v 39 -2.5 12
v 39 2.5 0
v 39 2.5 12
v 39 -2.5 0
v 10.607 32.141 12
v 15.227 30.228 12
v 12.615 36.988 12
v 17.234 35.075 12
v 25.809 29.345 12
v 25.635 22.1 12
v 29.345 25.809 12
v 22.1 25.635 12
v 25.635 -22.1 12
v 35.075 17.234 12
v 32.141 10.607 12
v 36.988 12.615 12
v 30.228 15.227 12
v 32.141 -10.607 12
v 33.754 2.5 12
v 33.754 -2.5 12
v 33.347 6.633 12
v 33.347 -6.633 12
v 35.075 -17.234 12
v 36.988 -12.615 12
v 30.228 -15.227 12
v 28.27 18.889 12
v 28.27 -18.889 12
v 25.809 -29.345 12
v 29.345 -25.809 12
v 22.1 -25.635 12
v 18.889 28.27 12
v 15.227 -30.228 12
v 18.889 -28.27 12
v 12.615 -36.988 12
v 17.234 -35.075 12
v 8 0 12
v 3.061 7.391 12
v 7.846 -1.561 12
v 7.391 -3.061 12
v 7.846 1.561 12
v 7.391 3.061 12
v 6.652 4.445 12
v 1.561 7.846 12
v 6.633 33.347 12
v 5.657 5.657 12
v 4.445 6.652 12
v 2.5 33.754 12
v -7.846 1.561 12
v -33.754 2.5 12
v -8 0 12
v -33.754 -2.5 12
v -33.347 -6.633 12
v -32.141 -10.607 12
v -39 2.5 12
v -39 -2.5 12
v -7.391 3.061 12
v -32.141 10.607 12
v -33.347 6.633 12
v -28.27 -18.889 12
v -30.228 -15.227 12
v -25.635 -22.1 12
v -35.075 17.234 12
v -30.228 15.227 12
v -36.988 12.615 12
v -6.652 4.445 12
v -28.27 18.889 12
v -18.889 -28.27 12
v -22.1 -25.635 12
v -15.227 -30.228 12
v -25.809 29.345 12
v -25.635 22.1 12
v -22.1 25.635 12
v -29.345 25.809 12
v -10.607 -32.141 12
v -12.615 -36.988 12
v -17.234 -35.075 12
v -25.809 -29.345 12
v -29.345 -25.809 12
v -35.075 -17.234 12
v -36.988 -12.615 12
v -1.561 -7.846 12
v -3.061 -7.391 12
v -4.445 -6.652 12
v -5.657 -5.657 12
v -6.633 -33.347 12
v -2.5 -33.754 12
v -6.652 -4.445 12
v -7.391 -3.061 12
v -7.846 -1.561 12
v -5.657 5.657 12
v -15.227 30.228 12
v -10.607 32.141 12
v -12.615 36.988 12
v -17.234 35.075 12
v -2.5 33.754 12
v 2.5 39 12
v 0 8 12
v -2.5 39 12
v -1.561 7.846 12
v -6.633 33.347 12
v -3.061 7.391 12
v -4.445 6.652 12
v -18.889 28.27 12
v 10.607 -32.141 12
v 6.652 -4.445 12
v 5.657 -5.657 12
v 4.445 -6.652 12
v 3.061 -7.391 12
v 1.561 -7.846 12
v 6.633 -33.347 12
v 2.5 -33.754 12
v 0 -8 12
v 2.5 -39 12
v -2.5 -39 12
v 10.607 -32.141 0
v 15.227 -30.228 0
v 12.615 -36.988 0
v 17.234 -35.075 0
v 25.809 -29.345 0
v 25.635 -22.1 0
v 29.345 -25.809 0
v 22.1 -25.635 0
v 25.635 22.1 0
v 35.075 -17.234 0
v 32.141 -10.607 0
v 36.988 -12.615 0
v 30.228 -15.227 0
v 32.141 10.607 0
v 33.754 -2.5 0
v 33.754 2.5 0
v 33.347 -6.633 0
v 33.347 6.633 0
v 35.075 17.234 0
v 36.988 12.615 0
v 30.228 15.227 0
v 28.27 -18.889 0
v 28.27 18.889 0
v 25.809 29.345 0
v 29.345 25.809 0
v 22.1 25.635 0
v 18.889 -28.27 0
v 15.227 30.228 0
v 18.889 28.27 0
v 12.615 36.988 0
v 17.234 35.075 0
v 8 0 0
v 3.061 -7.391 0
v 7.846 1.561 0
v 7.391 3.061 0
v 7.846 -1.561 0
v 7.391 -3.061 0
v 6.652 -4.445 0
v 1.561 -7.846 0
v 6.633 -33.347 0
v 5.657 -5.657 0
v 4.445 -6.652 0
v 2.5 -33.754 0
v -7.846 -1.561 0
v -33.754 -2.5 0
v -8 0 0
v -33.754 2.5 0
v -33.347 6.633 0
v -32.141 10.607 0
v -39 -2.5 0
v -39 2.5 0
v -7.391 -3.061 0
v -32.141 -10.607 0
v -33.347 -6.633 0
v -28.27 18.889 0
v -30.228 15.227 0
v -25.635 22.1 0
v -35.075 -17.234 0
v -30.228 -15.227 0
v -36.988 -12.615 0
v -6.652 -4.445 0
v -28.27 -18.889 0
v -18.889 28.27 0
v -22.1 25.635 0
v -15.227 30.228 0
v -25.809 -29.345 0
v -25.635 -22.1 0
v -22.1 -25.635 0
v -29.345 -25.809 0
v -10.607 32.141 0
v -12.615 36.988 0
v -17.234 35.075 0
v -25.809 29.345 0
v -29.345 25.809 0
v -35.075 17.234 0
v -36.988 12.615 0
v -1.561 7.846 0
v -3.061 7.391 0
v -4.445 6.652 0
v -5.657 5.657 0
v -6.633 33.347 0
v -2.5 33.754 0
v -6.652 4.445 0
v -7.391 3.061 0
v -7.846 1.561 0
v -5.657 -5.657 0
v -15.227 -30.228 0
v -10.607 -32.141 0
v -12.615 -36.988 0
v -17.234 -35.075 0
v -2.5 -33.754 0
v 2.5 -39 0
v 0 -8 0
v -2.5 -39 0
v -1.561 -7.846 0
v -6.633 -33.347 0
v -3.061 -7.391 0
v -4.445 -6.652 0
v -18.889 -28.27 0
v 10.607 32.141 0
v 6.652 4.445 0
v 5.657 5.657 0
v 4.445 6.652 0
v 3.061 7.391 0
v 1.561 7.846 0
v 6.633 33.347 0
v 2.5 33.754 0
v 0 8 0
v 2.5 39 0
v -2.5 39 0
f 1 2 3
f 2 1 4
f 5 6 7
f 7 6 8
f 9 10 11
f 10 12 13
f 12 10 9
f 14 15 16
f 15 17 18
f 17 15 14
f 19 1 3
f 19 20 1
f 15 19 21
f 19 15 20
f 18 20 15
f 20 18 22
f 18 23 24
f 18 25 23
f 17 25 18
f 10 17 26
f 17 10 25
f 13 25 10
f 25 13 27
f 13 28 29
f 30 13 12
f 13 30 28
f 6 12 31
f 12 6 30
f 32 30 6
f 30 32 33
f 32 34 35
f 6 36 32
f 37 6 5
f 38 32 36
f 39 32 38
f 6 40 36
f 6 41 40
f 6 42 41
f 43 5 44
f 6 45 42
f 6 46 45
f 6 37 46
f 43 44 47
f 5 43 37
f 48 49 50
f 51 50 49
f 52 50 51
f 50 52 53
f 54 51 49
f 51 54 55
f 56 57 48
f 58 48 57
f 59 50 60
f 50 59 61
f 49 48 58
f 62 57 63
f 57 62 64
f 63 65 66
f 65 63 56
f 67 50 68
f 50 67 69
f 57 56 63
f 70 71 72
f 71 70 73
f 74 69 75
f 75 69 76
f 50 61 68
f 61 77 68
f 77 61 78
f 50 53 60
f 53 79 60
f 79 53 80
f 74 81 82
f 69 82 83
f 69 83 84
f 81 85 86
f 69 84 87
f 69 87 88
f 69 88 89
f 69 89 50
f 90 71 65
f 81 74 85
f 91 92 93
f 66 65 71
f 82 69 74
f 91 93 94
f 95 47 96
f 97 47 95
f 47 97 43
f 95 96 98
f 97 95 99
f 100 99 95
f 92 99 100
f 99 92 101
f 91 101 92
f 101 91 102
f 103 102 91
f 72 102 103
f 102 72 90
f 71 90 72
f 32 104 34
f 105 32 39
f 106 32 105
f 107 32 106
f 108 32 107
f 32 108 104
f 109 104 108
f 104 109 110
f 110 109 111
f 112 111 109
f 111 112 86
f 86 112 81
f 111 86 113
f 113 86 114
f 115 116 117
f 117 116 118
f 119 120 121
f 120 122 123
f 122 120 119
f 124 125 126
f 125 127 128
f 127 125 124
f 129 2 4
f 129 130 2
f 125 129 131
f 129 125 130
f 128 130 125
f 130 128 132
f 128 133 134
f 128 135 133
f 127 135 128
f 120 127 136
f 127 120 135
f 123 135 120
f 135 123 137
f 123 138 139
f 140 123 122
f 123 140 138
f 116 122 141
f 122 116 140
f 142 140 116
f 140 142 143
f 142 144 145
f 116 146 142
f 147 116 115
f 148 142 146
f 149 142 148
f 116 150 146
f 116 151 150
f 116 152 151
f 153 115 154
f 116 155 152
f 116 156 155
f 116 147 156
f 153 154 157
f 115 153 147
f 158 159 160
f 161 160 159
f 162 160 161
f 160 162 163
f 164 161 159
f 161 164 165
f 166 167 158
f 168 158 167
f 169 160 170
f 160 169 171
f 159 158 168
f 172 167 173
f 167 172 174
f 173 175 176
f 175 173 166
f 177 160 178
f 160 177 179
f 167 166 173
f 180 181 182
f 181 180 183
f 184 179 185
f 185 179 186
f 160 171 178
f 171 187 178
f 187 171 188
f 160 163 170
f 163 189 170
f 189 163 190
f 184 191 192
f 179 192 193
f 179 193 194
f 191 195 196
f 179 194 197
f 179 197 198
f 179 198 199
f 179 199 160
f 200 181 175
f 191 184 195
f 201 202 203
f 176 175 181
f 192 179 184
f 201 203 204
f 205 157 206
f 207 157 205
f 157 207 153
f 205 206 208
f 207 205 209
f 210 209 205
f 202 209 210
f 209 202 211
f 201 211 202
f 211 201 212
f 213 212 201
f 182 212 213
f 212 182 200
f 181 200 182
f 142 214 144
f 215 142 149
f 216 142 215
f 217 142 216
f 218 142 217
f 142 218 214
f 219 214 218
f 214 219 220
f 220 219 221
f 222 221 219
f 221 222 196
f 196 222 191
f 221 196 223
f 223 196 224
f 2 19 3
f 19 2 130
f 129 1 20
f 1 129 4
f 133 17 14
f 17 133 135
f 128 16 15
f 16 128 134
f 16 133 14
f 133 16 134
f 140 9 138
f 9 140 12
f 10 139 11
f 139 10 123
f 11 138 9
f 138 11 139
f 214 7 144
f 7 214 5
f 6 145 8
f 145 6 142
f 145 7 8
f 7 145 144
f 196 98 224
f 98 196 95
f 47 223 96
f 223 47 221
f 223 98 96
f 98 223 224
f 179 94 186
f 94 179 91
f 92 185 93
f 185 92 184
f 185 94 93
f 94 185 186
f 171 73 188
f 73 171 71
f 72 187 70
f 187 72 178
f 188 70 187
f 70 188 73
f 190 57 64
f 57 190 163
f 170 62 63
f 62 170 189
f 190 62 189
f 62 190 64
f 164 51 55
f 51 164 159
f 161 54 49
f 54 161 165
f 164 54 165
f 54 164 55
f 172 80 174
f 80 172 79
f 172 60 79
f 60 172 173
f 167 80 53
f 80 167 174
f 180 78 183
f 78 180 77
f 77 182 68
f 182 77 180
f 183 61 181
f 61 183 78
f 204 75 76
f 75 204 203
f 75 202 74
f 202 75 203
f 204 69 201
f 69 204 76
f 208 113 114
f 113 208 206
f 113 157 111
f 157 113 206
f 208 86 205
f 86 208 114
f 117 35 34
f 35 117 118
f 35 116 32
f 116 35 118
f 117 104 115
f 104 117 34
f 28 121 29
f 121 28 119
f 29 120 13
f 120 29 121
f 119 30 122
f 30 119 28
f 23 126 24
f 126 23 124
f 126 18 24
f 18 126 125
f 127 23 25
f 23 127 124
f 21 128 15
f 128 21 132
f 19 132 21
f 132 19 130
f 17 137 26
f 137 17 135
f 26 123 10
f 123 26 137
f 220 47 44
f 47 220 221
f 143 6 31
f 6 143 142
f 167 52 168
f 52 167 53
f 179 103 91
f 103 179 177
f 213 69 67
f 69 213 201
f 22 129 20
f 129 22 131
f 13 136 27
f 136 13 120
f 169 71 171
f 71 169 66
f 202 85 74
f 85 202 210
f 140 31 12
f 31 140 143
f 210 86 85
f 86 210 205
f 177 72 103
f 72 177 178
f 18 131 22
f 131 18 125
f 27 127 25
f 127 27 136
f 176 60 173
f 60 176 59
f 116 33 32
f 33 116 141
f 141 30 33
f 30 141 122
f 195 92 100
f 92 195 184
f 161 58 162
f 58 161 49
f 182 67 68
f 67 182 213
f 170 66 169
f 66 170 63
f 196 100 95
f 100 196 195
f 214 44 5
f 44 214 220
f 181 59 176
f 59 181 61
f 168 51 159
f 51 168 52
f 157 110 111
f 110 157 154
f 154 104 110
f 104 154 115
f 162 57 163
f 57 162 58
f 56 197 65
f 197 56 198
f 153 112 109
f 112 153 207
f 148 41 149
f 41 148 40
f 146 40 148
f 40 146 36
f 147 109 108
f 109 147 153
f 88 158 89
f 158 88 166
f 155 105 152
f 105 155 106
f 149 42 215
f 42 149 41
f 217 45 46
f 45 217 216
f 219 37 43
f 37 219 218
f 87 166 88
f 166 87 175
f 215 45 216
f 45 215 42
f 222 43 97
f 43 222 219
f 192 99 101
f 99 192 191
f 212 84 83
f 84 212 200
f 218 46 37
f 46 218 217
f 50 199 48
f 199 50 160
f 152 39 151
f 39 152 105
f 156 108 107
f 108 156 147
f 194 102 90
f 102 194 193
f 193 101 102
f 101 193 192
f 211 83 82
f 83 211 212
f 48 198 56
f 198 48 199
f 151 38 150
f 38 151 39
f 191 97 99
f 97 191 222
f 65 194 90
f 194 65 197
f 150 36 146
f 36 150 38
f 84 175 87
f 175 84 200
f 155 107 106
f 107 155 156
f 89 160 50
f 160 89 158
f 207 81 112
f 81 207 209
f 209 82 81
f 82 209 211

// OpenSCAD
$fn = 32;

// ----------------------------------------------------------------------
// Spur blank: bored gear blank
// ----------------------------------------------------------------------

// --- parameters (mm) ---
disc_r = 34;              // blank root radius
disc_t = 12;              // blank thickness
n_teeth = 16;             // stub tooth count
tooth_w = 5;              // tooth width at the root
tooth_h = 5;              // tooth height above the root
bore_r = 8;               // central bore radius

out_r = disc_r + tooth_h;  // tip radius
bbox_x = 78.0;  // measured width over the teeth
bbox_y = 78.0;  // measured depth over the teeth

difference() {
union() {
  cylinder(r = disc_r, h = disc_t);
  for (i = [0 : n_teeth - 1])
    rotate([0, 0, i * 360 / n_teeth])
      translate([disc_r - 1, -tooth_w / 2, 0])
        cube([tooth_h + 1, tooth_w, disc_t]);
}
  translate([0, 0, -1]) cylinder(r = bore_r, h = disc_t + 2);
}
